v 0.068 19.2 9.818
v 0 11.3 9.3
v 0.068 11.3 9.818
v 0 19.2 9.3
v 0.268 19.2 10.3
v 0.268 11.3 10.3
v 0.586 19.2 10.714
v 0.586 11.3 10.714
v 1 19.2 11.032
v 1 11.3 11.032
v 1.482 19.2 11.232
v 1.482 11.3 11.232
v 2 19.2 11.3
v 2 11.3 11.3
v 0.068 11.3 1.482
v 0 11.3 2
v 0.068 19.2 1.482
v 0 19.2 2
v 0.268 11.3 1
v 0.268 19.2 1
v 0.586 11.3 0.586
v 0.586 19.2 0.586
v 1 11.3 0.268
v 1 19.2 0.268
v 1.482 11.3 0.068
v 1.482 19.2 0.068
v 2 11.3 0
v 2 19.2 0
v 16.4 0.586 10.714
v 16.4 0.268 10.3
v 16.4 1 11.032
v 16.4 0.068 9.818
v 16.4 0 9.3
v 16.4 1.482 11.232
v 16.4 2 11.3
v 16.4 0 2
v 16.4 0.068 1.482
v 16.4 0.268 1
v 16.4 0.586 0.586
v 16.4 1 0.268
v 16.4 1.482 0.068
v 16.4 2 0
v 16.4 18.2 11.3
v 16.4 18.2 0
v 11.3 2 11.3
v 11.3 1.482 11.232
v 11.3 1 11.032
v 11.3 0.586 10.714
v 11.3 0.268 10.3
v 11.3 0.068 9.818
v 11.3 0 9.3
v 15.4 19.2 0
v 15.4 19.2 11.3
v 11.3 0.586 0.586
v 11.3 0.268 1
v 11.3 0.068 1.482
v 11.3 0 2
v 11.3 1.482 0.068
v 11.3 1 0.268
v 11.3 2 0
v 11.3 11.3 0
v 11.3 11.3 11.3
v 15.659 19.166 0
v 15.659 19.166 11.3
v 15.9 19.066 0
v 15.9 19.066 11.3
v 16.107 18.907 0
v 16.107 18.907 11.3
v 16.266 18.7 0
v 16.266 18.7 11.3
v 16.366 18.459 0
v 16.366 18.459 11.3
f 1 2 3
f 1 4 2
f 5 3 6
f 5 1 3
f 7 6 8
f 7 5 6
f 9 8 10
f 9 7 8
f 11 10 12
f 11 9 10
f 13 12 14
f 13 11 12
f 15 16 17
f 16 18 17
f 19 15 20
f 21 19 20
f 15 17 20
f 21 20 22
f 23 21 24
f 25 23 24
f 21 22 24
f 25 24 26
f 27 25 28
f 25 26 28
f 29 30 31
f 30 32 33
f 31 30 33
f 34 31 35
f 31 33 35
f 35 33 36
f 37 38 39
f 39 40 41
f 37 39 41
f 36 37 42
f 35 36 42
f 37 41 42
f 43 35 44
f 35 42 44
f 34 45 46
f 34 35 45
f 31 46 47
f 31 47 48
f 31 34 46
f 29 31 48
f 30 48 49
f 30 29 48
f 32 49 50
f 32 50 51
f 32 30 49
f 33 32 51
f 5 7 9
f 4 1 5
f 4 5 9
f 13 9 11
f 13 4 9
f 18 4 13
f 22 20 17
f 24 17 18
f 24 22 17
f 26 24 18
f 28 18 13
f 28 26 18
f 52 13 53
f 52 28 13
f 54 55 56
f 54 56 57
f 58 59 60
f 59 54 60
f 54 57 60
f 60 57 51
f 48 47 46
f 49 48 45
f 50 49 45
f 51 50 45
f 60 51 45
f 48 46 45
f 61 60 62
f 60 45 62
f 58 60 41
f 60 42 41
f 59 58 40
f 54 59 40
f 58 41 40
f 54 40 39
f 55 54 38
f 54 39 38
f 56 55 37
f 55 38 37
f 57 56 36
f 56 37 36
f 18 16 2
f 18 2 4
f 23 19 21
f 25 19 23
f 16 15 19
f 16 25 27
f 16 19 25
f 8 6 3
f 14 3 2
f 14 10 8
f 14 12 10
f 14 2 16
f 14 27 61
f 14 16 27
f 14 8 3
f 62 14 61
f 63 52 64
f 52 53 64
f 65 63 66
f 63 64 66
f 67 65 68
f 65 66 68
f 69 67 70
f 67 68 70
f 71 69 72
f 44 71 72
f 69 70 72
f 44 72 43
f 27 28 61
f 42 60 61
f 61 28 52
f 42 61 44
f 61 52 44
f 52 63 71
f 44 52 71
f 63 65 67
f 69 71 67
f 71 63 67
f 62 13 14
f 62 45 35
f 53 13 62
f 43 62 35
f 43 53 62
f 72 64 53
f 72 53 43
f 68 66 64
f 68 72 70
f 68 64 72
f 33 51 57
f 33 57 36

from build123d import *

# Parameters (mm, degrees)
F0_W     = 16.4
F0_H     = 19.2
F1_DEPTH = 11.3
F2_W     = 11.3
F2_H     = 11.3
F3_DEPTH = 25
F4_R     = 2
F5_R     = 1


with BuildPart() as f1:
    # F0 (on Top) → F1 (new body)
    with BuildSketch(Plane.XY):
        with Locations((8.2, 9.6)):
            Rectangle(F0_W, F0_H)
    extrude(amount=F1_DEPTH)

    # F2 (on face) → F3 (cut)
    with BuildSketch(Plane.XY.offset(11.3)):
        with Locations((5.65, 5.65)):
            Rectangle(F2_W, F2_H)
    extrude(amount=-F3_DEPTH, mode=Mode.SUBTRACT)

    # F4
    f4_edges = [f1.edges().sort_by_distance(p)[0] for p in [
        (13.85, 0, 0),
        (0, 15.25, 0),
        (13.85, 0, 11.3),
        (0, 15.25, 11.3),
    ]]
    fillet(f4_edges, radius=F4_R)

    # F5
    f5_edges = [f1.edges().sort_by_distance(p)[0] for p in [
        (16.4, 19.2, 5.65),
    ]]
    fillet(f5_edges, radius=F5_R)


solid = f1.part
